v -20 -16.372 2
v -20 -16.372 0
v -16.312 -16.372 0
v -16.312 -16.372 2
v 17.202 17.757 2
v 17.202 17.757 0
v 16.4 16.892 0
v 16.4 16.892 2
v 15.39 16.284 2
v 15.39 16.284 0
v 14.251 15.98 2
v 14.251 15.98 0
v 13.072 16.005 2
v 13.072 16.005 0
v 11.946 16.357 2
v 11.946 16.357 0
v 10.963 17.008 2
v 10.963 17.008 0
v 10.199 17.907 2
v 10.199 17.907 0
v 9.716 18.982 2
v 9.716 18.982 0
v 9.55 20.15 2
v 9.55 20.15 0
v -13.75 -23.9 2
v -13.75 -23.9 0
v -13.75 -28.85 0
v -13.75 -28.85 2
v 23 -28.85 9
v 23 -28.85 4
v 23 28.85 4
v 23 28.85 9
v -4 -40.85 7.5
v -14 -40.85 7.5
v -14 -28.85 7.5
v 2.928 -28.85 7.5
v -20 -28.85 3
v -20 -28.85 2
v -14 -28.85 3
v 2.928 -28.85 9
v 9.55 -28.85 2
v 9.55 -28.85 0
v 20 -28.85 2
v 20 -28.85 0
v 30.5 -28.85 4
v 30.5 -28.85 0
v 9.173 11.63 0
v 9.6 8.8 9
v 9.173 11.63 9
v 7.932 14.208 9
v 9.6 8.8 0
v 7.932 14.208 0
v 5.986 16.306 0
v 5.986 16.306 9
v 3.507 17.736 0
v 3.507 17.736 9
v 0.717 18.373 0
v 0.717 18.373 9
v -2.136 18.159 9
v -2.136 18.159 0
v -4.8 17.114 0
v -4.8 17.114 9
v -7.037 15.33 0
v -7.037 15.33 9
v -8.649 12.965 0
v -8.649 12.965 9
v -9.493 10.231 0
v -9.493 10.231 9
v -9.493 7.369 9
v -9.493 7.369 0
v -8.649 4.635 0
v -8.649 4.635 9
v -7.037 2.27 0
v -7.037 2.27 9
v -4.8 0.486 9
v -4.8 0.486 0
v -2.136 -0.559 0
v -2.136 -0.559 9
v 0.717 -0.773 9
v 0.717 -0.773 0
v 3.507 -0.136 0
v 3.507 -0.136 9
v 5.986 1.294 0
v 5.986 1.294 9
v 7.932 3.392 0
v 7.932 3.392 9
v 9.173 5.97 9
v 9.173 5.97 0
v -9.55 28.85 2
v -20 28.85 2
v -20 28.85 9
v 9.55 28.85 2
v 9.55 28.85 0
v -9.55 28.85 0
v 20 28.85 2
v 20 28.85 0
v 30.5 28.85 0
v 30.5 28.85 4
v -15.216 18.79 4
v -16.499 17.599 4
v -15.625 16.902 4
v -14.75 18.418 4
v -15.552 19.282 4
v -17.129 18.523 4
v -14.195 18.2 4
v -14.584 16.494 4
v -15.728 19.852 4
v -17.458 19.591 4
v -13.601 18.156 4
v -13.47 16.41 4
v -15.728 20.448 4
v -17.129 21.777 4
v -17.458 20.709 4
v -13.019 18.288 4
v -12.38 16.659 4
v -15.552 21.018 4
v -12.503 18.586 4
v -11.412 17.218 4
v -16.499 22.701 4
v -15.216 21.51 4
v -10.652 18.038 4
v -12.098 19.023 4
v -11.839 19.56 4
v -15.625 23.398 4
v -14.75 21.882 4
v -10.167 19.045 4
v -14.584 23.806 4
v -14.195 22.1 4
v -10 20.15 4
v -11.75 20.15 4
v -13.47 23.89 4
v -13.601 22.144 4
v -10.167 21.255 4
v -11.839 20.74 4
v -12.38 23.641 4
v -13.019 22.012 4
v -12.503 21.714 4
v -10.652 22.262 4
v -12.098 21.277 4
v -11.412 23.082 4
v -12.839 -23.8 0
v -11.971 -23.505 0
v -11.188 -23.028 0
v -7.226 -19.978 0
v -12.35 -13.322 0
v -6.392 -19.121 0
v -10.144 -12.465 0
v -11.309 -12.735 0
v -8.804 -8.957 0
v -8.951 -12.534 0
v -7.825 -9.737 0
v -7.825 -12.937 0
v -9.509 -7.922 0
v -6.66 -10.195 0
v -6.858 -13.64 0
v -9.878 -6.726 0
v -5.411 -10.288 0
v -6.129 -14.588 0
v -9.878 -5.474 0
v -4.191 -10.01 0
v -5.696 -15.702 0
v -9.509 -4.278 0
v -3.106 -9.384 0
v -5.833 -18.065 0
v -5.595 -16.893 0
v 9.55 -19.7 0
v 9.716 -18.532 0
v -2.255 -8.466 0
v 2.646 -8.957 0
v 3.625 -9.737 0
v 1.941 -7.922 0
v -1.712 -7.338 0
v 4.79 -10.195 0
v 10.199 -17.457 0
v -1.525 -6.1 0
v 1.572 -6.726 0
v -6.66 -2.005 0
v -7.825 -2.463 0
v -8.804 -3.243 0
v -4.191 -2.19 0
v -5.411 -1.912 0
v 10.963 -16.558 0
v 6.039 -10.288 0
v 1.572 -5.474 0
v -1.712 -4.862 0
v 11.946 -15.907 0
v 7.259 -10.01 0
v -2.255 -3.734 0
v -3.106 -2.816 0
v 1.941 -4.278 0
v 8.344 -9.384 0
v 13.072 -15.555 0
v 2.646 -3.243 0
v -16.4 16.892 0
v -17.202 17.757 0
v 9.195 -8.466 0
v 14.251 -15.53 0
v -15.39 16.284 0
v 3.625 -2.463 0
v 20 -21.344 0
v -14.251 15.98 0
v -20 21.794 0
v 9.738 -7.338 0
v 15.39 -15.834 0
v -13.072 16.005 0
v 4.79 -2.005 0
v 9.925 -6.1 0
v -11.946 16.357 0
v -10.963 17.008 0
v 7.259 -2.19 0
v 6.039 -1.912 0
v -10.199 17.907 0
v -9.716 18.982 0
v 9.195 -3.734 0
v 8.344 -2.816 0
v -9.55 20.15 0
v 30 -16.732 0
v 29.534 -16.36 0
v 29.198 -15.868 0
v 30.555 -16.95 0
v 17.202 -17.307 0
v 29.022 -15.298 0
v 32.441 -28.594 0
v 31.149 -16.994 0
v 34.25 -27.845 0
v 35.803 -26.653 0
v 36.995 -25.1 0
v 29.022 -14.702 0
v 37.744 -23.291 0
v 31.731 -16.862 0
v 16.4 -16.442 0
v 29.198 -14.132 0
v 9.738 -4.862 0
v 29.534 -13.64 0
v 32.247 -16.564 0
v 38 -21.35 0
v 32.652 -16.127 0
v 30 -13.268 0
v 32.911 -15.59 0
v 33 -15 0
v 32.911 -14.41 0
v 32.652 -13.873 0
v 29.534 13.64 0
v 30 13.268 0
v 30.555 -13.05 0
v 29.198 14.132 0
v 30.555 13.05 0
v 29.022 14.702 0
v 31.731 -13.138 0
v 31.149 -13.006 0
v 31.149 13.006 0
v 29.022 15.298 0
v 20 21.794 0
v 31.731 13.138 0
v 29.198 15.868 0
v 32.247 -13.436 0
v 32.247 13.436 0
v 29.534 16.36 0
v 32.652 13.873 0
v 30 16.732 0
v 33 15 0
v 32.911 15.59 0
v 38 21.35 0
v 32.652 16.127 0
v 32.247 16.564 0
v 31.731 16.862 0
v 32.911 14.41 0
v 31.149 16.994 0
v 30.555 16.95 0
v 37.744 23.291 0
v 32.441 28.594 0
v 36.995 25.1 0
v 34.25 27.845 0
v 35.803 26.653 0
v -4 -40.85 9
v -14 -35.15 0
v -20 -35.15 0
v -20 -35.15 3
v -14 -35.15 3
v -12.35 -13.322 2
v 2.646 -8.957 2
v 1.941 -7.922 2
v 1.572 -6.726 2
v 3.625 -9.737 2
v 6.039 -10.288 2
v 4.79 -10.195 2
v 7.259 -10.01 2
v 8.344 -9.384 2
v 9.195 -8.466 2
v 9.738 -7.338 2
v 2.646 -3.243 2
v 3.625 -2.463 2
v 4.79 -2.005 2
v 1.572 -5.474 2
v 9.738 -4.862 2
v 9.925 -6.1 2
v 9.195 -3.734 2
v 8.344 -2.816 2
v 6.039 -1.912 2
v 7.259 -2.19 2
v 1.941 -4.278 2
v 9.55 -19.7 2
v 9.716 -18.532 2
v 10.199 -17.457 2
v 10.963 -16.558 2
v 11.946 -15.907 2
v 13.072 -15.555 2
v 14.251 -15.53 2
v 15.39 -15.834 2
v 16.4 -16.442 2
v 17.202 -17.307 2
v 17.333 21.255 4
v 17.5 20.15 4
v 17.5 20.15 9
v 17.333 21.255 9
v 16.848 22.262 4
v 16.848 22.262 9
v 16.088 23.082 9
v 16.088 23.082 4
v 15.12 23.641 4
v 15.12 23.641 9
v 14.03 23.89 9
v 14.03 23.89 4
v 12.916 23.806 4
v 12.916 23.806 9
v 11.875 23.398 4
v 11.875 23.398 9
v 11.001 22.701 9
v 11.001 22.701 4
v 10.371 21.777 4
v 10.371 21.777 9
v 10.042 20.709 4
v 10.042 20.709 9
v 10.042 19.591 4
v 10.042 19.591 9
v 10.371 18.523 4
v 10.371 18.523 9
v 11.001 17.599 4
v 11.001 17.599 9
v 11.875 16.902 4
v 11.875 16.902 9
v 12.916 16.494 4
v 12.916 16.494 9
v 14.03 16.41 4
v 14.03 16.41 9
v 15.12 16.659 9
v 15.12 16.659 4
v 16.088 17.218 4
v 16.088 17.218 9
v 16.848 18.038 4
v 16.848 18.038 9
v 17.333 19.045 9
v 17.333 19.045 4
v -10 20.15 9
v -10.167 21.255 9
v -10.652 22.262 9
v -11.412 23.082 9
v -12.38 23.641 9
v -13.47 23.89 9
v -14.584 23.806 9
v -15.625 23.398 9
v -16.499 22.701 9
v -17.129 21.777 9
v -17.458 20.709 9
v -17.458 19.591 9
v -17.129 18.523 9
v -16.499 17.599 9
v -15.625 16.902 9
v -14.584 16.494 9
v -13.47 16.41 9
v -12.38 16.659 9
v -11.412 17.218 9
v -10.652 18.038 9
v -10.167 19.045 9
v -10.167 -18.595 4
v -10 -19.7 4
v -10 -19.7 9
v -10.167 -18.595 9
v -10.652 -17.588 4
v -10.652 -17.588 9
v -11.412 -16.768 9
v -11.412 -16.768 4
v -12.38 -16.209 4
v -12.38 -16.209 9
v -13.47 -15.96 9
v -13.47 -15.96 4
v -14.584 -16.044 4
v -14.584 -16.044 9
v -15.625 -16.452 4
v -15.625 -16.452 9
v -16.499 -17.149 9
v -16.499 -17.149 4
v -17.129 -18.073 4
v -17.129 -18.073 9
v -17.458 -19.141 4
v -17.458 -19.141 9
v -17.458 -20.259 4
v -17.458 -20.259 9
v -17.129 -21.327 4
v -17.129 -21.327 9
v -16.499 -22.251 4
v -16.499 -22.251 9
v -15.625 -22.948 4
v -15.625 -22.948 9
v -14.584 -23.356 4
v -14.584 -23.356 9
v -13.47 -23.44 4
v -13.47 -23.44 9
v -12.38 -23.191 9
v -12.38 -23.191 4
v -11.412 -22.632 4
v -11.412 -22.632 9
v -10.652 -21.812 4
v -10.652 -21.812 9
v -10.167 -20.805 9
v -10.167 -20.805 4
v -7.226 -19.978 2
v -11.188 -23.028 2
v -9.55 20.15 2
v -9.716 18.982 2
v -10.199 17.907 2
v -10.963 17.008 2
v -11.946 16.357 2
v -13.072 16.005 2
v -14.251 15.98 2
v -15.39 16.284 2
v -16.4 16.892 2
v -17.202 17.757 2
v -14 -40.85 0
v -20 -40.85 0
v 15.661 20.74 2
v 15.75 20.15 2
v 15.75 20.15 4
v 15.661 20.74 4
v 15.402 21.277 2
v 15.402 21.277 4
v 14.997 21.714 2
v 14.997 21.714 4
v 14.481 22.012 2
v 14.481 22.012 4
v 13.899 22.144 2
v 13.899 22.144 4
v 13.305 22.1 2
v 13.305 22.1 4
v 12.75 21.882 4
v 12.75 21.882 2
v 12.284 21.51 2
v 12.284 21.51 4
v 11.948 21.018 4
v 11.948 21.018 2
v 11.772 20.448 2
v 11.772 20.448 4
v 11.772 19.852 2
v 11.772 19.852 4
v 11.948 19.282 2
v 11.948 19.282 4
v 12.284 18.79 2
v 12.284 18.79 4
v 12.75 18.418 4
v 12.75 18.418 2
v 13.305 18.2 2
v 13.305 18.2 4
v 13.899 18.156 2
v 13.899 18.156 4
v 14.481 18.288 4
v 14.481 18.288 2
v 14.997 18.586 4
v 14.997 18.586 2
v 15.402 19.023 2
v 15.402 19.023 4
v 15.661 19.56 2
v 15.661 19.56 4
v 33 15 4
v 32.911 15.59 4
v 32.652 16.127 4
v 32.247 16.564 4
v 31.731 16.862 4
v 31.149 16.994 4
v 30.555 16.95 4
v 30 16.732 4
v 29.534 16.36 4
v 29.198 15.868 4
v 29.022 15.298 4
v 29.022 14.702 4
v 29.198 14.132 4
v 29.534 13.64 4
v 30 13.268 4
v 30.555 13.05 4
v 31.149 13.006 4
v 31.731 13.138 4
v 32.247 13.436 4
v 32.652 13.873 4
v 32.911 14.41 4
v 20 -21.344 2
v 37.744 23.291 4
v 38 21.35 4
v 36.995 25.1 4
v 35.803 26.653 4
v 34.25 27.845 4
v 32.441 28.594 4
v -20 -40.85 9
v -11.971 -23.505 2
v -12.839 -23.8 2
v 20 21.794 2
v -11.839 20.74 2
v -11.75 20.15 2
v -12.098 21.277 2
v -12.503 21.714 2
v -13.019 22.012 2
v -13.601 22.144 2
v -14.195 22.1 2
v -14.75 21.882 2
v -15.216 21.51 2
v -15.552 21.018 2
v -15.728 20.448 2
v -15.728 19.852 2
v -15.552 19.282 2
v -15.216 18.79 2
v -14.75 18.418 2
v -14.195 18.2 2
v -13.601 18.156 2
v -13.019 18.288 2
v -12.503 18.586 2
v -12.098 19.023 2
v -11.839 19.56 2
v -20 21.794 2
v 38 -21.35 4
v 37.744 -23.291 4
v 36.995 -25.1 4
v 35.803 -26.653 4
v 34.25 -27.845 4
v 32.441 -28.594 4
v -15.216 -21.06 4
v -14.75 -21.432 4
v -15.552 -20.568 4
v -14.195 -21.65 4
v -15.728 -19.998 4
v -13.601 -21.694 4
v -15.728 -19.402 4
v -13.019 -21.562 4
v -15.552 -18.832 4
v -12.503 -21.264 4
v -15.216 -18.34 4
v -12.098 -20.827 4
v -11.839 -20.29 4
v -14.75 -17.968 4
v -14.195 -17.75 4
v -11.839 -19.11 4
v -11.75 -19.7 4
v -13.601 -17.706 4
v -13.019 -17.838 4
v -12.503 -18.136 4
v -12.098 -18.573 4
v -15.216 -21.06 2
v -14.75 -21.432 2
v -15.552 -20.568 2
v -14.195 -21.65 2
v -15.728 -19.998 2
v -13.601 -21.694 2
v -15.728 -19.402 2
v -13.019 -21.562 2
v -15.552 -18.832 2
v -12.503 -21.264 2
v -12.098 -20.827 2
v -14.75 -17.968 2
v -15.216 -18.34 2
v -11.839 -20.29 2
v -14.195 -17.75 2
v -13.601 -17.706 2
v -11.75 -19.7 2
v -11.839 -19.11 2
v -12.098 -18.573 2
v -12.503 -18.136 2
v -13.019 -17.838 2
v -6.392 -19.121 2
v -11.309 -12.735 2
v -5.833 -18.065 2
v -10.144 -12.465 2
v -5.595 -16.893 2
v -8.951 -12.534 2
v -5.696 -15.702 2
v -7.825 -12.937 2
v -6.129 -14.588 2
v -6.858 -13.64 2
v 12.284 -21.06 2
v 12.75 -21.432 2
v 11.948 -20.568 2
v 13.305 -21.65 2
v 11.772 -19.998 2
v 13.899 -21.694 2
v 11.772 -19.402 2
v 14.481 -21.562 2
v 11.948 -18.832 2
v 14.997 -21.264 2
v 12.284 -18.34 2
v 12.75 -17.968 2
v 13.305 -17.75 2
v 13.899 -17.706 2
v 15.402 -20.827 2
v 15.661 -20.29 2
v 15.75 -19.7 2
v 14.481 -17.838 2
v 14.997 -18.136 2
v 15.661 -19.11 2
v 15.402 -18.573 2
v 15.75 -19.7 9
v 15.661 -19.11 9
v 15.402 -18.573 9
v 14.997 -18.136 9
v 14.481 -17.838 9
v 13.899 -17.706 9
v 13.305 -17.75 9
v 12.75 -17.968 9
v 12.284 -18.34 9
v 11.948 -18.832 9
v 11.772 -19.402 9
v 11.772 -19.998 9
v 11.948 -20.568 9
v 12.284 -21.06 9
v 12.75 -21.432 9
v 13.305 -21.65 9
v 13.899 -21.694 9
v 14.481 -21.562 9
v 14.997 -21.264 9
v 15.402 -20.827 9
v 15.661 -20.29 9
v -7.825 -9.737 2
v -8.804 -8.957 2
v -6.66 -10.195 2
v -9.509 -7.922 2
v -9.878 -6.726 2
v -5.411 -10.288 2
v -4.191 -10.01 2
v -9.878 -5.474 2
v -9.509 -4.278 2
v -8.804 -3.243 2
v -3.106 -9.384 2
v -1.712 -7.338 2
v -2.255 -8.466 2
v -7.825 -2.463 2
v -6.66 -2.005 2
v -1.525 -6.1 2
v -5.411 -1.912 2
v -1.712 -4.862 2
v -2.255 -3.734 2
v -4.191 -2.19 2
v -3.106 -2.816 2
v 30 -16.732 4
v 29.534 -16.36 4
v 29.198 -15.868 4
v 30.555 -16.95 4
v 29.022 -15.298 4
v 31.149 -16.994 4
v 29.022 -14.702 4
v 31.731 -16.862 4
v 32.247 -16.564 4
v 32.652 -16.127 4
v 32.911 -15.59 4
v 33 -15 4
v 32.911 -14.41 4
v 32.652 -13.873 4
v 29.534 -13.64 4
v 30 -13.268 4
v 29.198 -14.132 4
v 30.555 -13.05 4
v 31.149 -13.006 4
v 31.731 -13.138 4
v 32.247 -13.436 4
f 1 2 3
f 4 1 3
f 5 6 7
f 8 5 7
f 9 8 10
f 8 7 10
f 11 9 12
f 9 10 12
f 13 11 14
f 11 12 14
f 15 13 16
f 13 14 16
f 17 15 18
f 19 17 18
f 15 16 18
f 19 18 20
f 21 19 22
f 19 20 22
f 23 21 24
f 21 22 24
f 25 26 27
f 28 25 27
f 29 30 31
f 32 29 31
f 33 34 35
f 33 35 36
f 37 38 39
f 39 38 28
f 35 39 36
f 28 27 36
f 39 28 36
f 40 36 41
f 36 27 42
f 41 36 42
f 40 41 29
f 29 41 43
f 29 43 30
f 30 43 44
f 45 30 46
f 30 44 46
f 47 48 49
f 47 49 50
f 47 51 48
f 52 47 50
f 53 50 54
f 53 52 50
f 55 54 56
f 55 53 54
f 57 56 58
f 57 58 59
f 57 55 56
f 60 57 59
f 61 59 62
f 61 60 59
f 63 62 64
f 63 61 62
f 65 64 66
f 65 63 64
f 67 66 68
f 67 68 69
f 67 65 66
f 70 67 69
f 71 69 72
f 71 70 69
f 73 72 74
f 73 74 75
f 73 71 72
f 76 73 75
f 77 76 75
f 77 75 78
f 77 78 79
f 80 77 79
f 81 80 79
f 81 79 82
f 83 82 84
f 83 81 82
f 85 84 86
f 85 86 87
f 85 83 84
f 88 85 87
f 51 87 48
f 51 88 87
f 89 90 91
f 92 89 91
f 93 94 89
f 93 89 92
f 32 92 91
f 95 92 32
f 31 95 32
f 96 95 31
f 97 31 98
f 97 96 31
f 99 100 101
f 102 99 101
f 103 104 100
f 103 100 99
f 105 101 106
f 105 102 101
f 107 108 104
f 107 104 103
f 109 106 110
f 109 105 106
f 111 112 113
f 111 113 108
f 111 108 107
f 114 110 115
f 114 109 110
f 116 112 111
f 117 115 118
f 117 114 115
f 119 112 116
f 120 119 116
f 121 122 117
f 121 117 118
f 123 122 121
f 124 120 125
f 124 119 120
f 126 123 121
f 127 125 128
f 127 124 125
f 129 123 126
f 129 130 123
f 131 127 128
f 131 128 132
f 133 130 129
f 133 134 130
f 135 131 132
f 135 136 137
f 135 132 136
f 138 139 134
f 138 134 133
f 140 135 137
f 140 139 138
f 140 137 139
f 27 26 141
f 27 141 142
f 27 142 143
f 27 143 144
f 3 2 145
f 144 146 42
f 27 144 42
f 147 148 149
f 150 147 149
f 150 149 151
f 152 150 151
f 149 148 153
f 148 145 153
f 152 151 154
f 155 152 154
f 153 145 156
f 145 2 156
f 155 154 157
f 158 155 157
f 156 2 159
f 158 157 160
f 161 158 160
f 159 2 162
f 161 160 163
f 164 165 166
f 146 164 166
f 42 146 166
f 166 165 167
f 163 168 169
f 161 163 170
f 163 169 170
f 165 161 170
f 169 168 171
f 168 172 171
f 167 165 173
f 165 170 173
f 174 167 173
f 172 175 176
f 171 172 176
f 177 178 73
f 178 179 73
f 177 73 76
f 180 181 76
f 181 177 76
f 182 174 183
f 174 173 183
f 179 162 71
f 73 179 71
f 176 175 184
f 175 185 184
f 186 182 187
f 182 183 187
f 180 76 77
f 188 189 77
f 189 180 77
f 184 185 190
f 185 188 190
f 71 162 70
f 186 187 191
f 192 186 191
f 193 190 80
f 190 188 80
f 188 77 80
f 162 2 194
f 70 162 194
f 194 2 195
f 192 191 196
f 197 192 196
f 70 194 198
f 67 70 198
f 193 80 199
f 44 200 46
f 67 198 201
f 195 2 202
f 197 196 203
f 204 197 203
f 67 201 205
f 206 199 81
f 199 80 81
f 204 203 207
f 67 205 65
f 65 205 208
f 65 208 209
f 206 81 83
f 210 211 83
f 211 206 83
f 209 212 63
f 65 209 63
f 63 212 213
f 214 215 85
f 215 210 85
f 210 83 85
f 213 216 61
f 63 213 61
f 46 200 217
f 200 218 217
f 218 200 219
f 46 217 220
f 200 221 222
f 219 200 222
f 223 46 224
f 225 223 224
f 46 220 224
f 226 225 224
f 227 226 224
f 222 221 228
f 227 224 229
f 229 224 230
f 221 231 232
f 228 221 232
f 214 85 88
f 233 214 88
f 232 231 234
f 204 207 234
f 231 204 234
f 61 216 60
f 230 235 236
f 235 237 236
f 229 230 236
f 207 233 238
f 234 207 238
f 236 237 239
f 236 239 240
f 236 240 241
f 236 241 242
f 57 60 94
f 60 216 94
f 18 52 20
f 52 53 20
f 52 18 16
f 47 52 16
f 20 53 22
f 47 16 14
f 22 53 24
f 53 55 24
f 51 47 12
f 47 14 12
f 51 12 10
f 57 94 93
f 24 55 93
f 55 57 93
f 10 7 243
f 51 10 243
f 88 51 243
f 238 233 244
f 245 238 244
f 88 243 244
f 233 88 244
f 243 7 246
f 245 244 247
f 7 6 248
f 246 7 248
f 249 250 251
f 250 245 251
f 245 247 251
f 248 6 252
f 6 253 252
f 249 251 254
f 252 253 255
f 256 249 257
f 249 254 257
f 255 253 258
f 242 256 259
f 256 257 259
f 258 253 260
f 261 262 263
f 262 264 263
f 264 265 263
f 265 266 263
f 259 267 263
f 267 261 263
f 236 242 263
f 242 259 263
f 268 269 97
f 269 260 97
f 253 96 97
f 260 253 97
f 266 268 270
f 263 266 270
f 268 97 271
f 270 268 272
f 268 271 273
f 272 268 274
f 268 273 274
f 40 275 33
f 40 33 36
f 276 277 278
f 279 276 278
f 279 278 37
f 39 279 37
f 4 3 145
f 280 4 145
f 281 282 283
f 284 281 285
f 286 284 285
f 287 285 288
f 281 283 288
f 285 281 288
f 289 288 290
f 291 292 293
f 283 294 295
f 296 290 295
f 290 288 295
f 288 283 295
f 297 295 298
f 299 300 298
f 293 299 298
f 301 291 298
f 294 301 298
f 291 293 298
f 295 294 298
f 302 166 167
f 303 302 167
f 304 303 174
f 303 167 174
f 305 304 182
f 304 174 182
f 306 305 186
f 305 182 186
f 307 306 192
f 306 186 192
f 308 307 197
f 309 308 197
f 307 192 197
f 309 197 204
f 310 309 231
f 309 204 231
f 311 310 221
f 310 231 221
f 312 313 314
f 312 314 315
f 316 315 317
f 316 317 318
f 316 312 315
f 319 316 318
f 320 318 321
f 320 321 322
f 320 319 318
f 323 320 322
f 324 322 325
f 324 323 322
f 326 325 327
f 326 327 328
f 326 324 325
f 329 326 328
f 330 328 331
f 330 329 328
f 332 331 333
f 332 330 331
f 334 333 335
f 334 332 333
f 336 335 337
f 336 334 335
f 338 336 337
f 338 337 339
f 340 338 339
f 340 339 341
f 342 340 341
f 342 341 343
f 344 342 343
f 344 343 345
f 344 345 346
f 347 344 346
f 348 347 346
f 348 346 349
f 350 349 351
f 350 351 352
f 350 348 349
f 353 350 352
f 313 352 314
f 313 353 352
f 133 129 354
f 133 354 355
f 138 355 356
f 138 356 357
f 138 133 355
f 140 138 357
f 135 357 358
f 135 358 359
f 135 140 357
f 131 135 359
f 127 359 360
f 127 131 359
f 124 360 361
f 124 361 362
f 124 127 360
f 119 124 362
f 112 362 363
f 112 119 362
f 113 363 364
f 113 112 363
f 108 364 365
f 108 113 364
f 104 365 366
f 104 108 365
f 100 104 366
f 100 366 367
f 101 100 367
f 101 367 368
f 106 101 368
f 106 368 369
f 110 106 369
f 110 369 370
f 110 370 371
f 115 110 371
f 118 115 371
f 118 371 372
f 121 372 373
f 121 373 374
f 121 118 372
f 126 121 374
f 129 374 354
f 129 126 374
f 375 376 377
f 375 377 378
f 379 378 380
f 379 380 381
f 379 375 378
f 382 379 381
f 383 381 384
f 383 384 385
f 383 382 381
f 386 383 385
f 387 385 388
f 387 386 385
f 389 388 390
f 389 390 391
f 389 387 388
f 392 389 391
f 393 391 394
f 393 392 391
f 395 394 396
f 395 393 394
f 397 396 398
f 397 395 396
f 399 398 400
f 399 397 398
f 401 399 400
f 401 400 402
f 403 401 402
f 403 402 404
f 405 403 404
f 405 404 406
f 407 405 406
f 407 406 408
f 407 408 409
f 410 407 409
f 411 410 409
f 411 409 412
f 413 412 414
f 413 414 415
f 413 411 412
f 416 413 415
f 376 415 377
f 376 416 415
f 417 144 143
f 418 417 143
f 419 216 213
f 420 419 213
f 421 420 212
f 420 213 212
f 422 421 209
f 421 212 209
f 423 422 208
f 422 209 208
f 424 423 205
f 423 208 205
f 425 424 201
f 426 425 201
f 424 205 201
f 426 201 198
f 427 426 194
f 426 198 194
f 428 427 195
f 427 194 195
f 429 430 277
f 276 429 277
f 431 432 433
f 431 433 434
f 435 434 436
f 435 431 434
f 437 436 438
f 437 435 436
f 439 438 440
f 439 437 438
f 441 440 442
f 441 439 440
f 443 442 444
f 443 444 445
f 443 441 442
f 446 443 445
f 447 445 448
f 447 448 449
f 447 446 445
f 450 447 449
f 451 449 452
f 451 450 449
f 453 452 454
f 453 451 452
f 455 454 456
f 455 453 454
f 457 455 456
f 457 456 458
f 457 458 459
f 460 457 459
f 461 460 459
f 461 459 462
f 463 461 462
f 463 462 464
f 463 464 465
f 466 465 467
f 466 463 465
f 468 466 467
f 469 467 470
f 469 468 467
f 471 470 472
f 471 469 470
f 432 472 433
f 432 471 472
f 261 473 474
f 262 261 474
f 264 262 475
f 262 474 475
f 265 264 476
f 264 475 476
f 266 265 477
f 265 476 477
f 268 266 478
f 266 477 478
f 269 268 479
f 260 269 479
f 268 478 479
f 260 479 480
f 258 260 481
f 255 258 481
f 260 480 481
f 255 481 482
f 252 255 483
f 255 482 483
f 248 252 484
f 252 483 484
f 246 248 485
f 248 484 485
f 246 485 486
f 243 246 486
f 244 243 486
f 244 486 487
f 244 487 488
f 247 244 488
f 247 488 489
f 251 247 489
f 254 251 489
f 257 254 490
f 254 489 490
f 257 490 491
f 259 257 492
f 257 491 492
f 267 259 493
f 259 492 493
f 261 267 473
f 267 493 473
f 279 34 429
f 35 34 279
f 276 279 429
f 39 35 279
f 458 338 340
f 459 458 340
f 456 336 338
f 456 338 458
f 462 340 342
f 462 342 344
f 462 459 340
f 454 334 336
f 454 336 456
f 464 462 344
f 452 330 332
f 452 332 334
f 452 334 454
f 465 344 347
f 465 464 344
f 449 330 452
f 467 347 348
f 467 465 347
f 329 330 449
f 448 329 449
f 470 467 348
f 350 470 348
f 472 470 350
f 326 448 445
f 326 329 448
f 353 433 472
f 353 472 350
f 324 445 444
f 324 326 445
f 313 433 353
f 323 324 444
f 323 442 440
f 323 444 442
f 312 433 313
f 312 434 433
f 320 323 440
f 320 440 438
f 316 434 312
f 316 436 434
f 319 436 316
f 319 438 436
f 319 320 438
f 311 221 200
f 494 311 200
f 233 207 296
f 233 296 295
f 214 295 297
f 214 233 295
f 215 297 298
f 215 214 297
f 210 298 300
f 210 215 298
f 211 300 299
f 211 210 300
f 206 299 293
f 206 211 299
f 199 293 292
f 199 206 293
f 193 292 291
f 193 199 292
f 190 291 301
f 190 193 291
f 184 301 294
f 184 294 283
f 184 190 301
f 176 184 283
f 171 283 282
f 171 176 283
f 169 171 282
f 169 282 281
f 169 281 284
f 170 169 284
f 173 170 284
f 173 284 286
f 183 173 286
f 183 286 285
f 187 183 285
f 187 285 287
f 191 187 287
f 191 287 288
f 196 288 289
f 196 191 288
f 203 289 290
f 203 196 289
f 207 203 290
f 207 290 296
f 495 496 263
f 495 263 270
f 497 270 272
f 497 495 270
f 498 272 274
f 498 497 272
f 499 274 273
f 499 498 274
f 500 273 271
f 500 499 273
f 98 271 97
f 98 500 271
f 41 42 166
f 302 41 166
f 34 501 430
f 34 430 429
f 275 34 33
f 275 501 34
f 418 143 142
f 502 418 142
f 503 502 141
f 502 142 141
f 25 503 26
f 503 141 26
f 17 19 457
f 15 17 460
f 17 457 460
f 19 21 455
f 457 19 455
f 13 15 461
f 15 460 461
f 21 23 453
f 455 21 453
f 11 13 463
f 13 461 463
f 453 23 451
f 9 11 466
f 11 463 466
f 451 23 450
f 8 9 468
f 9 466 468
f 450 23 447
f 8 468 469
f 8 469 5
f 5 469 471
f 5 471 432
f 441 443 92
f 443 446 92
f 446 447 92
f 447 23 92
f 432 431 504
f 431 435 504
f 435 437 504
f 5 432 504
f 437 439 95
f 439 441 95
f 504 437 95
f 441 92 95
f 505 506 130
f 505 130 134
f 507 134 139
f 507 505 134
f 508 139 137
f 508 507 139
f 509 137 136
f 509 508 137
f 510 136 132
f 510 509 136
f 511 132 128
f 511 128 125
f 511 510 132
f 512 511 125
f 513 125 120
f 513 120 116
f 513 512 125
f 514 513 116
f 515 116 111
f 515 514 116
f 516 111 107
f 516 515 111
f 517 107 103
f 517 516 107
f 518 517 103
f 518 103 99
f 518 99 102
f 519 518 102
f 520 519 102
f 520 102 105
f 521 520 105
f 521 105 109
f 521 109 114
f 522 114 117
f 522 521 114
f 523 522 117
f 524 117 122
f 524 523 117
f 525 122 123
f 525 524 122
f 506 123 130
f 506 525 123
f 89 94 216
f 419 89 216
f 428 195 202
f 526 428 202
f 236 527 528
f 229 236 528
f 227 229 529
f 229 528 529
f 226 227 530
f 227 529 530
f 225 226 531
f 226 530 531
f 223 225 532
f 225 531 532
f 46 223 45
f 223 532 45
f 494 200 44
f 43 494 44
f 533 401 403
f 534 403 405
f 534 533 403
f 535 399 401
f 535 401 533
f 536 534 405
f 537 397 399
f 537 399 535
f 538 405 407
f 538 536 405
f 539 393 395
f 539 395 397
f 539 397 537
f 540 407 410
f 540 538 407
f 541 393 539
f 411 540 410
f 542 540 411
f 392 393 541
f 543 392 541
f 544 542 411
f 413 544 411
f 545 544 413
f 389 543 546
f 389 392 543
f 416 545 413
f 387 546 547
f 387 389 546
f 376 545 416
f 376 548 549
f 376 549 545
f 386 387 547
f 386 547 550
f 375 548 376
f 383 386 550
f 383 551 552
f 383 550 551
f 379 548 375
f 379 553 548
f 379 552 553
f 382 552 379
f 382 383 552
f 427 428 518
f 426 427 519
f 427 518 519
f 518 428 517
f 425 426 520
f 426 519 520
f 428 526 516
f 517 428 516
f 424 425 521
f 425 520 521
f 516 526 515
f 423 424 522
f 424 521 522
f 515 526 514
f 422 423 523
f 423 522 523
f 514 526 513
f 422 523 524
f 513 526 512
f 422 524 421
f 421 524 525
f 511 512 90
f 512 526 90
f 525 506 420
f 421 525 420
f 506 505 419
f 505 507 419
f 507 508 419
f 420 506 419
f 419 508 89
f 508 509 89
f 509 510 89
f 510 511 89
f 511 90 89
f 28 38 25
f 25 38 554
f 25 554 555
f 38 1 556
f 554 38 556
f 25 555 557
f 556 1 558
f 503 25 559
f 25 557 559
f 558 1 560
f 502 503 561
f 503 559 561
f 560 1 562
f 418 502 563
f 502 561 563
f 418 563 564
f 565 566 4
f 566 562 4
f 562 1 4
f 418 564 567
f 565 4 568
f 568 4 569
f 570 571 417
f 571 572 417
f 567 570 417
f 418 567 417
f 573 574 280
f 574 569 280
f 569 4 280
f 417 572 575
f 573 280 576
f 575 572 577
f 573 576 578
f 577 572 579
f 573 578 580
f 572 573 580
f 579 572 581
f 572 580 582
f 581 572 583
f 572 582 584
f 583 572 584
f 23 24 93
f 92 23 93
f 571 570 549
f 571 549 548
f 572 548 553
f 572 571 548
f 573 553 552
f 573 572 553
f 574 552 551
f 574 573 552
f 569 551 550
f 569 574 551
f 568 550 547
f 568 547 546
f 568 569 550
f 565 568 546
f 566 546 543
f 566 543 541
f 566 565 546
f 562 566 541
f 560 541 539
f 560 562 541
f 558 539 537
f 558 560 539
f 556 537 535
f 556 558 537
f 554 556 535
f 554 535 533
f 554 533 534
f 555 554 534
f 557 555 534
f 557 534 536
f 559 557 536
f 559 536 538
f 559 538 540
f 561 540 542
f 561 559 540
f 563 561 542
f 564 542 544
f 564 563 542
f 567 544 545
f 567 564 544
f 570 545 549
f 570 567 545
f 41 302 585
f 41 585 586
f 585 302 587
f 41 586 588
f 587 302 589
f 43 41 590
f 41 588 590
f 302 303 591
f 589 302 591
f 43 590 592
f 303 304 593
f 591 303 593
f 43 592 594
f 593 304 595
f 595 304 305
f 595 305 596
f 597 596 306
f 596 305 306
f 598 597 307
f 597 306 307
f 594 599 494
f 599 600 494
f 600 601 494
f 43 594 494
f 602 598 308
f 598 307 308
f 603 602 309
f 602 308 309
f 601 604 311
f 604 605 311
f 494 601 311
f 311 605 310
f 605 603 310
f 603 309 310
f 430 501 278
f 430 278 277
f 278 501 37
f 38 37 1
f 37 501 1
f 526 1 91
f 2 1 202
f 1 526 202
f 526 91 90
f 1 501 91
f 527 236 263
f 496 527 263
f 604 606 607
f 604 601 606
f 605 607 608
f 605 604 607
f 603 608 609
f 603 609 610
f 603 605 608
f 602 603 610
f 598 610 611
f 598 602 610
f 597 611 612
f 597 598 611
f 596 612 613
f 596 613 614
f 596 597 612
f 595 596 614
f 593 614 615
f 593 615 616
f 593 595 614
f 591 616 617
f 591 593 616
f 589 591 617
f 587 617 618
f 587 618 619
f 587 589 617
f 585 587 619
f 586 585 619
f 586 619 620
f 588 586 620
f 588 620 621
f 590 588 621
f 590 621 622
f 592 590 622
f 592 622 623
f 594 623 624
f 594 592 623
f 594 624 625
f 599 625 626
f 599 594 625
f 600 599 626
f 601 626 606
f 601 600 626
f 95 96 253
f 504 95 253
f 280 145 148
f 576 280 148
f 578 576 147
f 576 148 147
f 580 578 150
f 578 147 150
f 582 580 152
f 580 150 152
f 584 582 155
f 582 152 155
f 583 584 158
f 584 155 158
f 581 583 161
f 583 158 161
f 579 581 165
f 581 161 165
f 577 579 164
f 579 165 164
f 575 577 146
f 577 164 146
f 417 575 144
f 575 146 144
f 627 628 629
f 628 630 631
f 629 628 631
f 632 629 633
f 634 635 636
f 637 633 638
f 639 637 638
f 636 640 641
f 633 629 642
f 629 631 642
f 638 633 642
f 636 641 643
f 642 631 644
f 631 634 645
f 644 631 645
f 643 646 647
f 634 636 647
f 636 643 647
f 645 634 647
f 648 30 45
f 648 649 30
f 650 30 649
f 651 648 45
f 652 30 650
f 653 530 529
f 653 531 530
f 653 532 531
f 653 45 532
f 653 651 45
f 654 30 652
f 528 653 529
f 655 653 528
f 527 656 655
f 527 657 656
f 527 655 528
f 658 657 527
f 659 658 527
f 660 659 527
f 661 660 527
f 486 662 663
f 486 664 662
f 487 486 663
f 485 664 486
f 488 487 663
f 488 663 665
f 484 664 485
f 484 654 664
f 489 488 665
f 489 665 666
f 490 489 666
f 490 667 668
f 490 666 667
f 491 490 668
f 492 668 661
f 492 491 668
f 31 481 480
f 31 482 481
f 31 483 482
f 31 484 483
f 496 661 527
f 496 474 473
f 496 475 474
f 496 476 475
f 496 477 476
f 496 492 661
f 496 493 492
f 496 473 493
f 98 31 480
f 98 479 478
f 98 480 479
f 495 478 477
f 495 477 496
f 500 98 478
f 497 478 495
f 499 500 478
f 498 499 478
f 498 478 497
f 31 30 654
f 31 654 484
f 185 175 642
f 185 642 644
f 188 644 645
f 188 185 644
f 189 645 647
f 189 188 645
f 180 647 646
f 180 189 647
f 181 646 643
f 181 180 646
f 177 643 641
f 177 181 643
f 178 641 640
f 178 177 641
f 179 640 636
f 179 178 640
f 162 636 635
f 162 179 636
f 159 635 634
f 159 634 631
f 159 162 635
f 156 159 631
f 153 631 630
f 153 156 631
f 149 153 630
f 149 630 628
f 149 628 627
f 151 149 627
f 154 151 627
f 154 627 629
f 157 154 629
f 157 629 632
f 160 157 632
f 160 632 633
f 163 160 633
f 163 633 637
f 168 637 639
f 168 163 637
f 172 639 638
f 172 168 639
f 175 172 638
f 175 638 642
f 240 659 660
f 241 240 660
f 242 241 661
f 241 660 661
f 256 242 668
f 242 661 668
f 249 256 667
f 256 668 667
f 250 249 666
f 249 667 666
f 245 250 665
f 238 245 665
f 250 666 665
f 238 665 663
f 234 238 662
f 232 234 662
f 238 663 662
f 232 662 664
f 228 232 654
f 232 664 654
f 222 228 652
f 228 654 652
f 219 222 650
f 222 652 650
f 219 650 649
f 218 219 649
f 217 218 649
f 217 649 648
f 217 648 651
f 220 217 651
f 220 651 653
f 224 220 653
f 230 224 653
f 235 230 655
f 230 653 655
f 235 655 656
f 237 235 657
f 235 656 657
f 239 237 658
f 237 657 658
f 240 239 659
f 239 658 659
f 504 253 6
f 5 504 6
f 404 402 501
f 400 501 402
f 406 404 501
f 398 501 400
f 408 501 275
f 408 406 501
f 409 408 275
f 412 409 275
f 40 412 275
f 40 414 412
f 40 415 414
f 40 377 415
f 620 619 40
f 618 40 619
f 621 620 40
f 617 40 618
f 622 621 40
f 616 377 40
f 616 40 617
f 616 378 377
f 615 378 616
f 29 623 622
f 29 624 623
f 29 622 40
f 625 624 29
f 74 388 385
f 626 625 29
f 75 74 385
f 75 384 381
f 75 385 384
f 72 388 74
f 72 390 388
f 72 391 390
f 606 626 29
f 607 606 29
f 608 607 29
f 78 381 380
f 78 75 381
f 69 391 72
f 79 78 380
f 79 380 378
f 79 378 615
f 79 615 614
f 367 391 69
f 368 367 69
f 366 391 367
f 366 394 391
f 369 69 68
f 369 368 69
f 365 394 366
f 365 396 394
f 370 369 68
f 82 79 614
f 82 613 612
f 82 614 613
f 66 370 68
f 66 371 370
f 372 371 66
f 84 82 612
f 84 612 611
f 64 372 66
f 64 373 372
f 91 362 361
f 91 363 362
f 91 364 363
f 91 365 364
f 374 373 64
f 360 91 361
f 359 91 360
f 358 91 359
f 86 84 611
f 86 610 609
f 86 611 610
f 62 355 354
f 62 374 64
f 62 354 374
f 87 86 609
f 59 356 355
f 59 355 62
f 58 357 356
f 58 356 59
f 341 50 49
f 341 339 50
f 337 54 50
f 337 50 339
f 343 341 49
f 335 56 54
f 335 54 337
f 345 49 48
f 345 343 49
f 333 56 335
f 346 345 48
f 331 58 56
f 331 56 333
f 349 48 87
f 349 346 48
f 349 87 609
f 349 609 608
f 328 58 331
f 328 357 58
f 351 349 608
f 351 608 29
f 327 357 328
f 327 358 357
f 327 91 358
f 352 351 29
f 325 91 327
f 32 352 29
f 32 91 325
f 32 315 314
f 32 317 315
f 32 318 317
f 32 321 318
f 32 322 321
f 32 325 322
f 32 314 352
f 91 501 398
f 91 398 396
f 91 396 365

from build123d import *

# Parameters (mm, degrees)
SKETCH1_R           = 9.6
SKETCH1_R_2         = 4.2
BOSS_EXTRUDE1_DEPTH = 2
SKETCH4_W           = 58
SKETCH4_H           = 57.7
SKETCH4_R           = 2
SKETCH4_R_2         = 9.6
BOSS_EXTRUDE3_DEPTH = 2
SKETCH5_R           = 2
CUT_EXTRUDE1_DEPTH  = 4
SKETCH6_W           = 43
SKETCH6_H           = 57.7
SKETCH6_R           = 3.75
SKETCH6_R_2         = 9.6
SKETCH6_R_3         = 2
BOSS_EXTRUDE4_DEPTH = 5
CUT_EXTRUDE2_DEPTH  = 48.972101267
BOSS_EXTRUDE5_DEPTH = 6
BOSS_EXTRUDE6_DEPTH = 1.5


with BuildPart() as part:
    # Sketch1 → Boss-Extrude1 (new body)
    with BuildSketch(Plane.XY):
        with BuildLine():
            Line((38, 28.85), (20, 28.85))
            Line((20, 28.85), (20, 21.79369023))
            Line((20, 21.79369023), (17.201699017, 17.757141063))
            ThreePointArc((17.201699017, 17.757141063), (12.496432266, 16.141438171), (9.55, 20.15))
            Line((9.55, 20.15), (9.55, 28.85))
            Line((9.55, 28.85), (-9.55, 28.85))
            Line((-9.55, 28.85), (-9.55, 20.15))
            ThreePointArc((-9.55, 20.15), (-12.496432266, 16.141438171), (-17.201699017, 17.757141063))
            Line((-17.201699017, 17.757141063), (-20, 21.79369023))
            Line((-20, 21.79369023), (-20, -16.371914064))
            Line((-20, -16.371914064), (-16.312, -16.371914064))
            Line((-16.312, -16.371914064), (-12.349992933, -13.321914064))
            ThreePointArc((-12.349992933, -13.321914064), (-6.459906996, -14.088), (-7.225992933, -19.978085936))
            Line((-7.225992933, -19.978085936), (-11.188, -23.028085936))
            ThreePointArc((-11.188, -23.028085936), (-12.396848296, -23.676050863), (-13.75, -23.9))
            Line((-13.75, -23.9), (-13.75, -28.85))
            Line((-13.75, -28.85), (9.55, -28.85))
            Line((9.55, -28.85), (9.55, -19.7))
            ThreePointArc((9.55, -19.7), (12.496432266, -15.691438171), (17.201699017, -17.307141063))
            Line((17.201699017, -17.307141063), (20, -21.34369023))
            Line((20, -21.34369023), (20, -28.85))
            Line((20, -28.85), (38, -28.85))
            Line((38, -28.85), (38, 28.85))
        make_face()
        with Locations((0, 8.8)):
            Circle(SKETCH1_R, mode=Mode.SUBTRACT)
        with Locations((-5.725, -6.1)):
            Circle(SKETCH1_R_2, mode=Mode.SUBTRACT)
        with Locations((5.725, -6.1)):
            Circle(SKETCH1_R_2, mode=Mode.SUBTRACT)
    extrude(amount=BOSS_EXTRUDE1_DEPTH)

    # Sketch4 → Boss-Extrude3 (add)
    with BuildSketch(Plane.XY.offset(2)):
        with Locations((9, 0)):
            Rectangle(SKETCH4_W, SKETCH4_H)
        with Locations((13.75, -19.7)):
            Circle(SKETCH4_R, mode=Mode.SUBTRACT)
        with Locations((-13.75, 20.15)):
            Circle(SKETCH4_R, mode=Mode.SUBTRACT)
        with Locations((13.75, 20.15)):
            Circle(SKETCH4_R, mode=Mode.SUBTRACT)
        with Locations((-13.75, -19.7)):
            Circle(SKETCH4_R, mode=Mode.SUBTRACT)
        with Locations((0, 8.8)):
            Circle(SKETCH4_R_2, mode=Mode.SUBTRACT)
    extrude(amount=BOSS_EXTRUDE3_DEPTH)

    # Sketch5 → Cut-Extrude1 (cut)
    with BuildSketch(Plane.XY.offset(4)):
        with Locations((31, 15)):
            Circle(SKETCH5_R)
        with Locations((31, -15)):
            Circle(SKETCH5_R)
    extrude(amount=-CUT_EXTRUDE1_DEPTH, mode=Mode.SUBTRACT)

    # Sketch6 → Boss-Extrude4 (add)
    with BuildSketch(Plane.XY.offset(4)):
        with Locations((1.5, 0)):
            Rectangle(SKETCH6_W, SKETCH6_H)
        with Locations((-13.75, -19.7)):
            Circle(SKETCH6_R, mode=Mode.SUBTRACT)
        with Locations((0, 8.8)):
            Circle(SKETCH6_R_2, mode=Mode.SUBTRACT)
        with Locations((-13.75, 20.15)):
            Circle(SKETCH6_R, mode=Mode.SUBTRACT)
        with Locations((13.75, 20.15)):
            Circle(SKETCH6_R, mode=Mode.SUBTRACT)
        with Locations((13.75, -19.7)):
            Circle(SKETCH6_R_3, mode=Mode.SUBTRACT)
    extrude(amount=BOSS_EXTRUDE4_DEPTH)

    # Sketch7 → Cut-Extrude2 (cut, through all)
    with BuildSketch(Plane.XY.offset(4)):
        with BuildLine():
            Line((30.5, 28.85), (38, 28.85))
            Line((38, 28.85), (38, 21.35))
            ThreePointArc((38, 21.35), (35.803300859, 26.653300859), (30.5, 28.85))
        make_face()
        with BuildLine():
            Line((38, -28.85), (38, -21.35))
            ThreePointArc((38, -21.35), (35.803300859, -26.653300859), (30.5, -28.85))
            Line((30.5, -28.85), (38, -28.85))
        make_face()
    extrude(amount=-CUT_EXTRUDE2_DEPTH, mode=Mode.SUBTRACT)

    # Sketch9 → Boss-Extrude5 (add)
    with BuildSketch(Plane.ZY.offset(20)):
        Polygon((9, -28.85), (9, -40.85), (0, -40.85), (0, -35.15), (3, -35.15), (3, -28.85), align=None)
    extrude(amount=-BOSS_EXTRUDE5_DEPTH)

    # Sketch10 → Boss-Extrude6 (add)
    with BuildSketch(Plane.XY.offset(9)):
        Polygon((-14, -40.85), (-4, -40.85), (2.92820323, -28.85), (-14, -28.85), align=None)
    extrude(amount=-BOSS_EXTRUDE6_DEPTH)


solid = part.part
